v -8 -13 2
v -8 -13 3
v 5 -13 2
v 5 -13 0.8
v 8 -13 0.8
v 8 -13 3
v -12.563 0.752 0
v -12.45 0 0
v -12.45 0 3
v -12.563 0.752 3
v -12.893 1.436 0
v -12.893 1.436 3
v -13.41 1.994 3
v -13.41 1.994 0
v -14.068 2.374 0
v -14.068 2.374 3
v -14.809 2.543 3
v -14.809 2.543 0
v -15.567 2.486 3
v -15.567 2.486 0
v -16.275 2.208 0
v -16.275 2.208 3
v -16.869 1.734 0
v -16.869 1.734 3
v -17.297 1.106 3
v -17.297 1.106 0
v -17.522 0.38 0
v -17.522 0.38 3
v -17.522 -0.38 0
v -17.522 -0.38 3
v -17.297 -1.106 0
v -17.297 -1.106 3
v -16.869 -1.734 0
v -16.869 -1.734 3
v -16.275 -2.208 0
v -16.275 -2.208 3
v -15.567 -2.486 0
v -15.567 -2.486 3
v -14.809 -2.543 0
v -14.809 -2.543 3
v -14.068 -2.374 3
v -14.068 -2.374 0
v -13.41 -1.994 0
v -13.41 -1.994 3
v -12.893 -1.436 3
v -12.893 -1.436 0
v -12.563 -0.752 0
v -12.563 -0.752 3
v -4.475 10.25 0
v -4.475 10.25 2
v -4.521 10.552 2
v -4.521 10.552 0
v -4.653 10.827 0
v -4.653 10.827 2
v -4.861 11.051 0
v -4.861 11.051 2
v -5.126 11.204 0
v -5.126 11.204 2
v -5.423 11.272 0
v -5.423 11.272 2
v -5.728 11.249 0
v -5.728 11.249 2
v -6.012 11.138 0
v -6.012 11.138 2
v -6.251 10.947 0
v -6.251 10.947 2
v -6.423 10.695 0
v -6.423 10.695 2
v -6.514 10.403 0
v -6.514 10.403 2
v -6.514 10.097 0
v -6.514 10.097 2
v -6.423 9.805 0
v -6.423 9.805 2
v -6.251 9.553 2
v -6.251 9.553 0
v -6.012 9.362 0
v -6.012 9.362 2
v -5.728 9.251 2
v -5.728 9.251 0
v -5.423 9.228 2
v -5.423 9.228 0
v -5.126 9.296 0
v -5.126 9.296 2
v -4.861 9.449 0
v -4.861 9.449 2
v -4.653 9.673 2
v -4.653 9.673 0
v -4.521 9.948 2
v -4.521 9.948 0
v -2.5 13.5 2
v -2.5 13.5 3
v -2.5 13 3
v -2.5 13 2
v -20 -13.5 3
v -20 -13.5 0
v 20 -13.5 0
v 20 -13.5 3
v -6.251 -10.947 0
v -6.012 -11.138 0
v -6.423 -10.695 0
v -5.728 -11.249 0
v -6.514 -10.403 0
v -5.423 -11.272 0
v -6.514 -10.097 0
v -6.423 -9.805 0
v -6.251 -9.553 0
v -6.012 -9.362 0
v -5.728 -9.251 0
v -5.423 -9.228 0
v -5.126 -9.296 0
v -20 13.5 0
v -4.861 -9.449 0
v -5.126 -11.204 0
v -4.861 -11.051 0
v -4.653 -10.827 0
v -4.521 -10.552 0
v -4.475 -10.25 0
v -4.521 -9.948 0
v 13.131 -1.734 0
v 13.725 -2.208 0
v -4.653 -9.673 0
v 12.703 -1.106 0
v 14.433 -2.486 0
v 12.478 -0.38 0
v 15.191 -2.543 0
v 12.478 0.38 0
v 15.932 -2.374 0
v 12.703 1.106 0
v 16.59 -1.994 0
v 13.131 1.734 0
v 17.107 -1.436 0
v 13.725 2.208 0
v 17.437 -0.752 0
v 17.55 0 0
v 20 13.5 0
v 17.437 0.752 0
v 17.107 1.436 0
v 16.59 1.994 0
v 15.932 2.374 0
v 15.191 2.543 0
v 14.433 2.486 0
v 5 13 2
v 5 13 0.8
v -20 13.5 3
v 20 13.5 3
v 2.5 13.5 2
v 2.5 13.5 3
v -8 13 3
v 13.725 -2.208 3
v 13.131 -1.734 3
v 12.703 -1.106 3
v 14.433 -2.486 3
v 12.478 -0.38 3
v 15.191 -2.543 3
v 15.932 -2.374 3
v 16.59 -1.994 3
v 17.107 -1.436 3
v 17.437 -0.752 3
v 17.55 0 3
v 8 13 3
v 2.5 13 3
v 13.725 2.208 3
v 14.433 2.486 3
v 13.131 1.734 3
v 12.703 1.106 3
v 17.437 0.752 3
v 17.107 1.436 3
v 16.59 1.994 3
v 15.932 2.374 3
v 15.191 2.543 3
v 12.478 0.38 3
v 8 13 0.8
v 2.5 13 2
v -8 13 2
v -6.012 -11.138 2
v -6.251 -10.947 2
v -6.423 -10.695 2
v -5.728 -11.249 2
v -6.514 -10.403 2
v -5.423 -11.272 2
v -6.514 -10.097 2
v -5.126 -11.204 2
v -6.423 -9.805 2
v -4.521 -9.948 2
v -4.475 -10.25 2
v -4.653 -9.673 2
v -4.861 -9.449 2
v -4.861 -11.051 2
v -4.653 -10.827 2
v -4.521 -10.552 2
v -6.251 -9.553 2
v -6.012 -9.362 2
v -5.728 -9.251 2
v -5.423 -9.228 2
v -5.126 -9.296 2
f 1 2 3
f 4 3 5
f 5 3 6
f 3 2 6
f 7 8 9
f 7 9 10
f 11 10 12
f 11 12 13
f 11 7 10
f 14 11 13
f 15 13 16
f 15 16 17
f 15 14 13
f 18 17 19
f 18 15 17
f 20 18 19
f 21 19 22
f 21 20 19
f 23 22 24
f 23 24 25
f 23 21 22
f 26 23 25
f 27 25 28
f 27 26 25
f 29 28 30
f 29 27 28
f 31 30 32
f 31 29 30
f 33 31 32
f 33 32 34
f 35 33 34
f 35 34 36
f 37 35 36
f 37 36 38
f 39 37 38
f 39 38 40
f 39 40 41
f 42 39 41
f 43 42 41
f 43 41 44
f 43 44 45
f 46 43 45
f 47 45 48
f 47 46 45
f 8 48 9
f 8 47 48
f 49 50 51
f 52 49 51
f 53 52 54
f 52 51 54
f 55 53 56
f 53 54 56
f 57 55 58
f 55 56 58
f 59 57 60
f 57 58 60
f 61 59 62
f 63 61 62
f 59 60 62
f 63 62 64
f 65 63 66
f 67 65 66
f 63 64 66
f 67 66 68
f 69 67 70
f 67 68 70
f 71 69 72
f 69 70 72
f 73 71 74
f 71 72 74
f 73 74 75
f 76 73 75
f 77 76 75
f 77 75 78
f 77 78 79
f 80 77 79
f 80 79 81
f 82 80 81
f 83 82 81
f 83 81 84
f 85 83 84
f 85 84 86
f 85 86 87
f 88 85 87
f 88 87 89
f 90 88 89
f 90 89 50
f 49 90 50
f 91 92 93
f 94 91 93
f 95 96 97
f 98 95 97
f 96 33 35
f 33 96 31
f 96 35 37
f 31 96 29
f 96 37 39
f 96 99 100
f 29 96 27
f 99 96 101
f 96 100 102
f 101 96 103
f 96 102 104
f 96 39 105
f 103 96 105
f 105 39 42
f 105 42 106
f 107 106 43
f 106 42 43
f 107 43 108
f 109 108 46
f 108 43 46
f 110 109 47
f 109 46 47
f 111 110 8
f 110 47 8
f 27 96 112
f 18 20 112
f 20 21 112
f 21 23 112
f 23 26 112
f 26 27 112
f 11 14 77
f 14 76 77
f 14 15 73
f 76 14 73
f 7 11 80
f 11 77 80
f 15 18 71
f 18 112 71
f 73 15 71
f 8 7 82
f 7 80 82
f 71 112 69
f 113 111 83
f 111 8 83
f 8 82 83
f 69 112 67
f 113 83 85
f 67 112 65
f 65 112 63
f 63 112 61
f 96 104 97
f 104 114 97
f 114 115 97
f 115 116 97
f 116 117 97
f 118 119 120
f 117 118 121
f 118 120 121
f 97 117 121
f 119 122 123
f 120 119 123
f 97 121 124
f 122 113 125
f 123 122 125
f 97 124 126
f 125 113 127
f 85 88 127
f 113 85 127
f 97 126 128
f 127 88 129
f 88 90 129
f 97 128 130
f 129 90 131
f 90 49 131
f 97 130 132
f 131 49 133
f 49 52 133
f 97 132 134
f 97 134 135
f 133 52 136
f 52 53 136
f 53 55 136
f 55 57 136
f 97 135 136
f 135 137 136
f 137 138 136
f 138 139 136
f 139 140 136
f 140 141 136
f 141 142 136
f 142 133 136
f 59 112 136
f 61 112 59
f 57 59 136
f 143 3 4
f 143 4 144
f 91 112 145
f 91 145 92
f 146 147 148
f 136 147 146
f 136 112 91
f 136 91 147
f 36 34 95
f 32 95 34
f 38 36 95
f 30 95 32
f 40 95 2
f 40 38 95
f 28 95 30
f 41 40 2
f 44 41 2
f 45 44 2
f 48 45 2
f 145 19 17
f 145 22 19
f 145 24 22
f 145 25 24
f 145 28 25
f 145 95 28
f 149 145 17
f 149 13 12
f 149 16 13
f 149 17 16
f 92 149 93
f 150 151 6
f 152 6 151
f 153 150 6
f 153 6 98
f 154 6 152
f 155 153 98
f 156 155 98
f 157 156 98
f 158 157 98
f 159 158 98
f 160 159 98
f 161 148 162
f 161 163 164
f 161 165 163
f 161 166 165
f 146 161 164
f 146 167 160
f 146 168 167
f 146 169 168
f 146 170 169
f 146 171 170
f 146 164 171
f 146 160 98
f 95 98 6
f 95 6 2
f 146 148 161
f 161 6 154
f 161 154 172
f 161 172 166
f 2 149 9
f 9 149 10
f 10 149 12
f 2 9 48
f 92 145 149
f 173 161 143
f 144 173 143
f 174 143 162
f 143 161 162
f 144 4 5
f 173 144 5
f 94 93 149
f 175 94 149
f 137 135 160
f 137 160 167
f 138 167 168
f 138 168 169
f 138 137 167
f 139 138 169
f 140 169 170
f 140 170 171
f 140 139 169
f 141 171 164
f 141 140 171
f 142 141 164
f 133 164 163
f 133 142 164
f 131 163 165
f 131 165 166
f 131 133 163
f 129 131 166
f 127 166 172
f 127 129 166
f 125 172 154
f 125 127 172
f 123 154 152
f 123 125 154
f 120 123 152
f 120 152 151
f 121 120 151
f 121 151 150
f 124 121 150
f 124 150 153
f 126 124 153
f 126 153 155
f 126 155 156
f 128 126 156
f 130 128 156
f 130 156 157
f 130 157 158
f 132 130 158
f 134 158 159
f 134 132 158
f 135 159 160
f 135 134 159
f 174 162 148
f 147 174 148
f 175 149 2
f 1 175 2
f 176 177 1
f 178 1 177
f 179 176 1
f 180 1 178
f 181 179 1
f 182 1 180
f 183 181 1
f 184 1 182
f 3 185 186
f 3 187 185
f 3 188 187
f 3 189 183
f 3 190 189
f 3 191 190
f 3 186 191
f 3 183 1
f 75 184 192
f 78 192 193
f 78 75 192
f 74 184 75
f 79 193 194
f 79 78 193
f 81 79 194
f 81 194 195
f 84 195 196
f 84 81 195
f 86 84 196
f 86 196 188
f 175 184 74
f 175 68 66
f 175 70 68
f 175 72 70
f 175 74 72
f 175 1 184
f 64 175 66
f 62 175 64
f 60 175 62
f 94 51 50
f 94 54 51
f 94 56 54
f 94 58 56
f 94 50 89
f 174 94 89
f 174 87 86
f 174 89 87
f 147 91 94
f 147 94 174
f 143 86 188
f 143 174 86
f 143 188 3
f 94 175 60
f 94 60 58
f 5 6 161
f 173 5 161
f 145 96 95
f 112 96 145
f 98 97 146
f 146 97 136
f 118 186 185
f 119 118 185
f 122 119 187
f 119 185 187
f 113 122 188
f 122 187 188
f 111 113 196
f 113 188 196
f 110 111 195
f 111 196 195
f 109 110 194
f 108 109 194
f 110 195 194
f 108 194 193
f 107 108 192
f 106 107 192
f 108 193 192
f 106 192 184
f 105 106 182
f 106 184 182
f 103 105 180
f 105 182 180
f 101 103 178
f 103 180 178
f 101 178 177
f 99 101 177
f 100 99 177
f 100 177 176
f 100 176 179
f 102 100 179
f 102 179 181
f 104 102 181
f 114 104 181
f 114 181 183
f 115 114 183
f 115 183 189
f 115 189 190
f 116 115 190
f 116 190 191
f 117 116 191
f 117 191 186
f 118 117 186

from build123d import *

# Parameters (mm, degrees)
SKETCH3_W           = 40
SKETCH3_H           = 27
SKETCH3_R           = 2.55
BOSS_EXTRUDE1_DEPTH = 3
CUT_EXTRUDE1_DEPTH  = 1
SKETCH5_W           = 3
SKETCH5_H           = 26
CUT_EXTRUDE2_DEPTH  = 1.2
SKETCH6_R           = 1.025
CUT_EXTRUDE3_DEPTH  = 3


with BuildPart() as part:
    # Sketch3 → Boss-Extrude1 (new body)
    with BuildSketch(Plane.XY):
        Rectangle(SKETCH3_W, SKETCH3_H)
        with Locations((-15, 0)):
            Circle(SKETCH3_R, mode=Mode.SUBTRACT)
        with Locations((15, 0)):
            Circle(SKETCH3_R, mode=Mode.SUBTRACT)
    extrude(amount=BOSS_EXTRUDE1_DEPTH)

    # Sketch4 → Cut-Extrude1 (cut)
    with BuildSketch(Plane.XY.offset(3)):
        Polygon((-8, 13), (-8, -13), (8, -13), (8, 13), (2.5, 13), (2.5, 13.5), (-2.5, 13.5), (-2.5, 13), align=None)
    extrude(amount=-CUT_EXTRUDE1_DEPTH, mode=Mode.SUBTRACT)

    # Sketch5 → Cut-Extrude2 (cut)
    with BuildSketch(Plane.XY.offset(2)):
        with Locations((6.5, 0)):
            Rectangle(SKETCH5_W, SKETCH5_H)
    extrude(amount=-CUT_EXTRUDE2_DEPTH, mode=Mode.SUBTRACT)

    # Sketch6 → Cut-Extrude3 (cut)
    with BuildSketch(Plane.XY.offset(2)):
        with Locations((-5.5, 10.25)):
            Circle(SKETCH6_R)
        with Locations((-5.5, -10.25)):
            Circle(SKETCH6_R)
    extrude(amount=-CUT_EXTRUDE3_DEPTH, mode=Mode.SUBTRACT)


solid = part.part
